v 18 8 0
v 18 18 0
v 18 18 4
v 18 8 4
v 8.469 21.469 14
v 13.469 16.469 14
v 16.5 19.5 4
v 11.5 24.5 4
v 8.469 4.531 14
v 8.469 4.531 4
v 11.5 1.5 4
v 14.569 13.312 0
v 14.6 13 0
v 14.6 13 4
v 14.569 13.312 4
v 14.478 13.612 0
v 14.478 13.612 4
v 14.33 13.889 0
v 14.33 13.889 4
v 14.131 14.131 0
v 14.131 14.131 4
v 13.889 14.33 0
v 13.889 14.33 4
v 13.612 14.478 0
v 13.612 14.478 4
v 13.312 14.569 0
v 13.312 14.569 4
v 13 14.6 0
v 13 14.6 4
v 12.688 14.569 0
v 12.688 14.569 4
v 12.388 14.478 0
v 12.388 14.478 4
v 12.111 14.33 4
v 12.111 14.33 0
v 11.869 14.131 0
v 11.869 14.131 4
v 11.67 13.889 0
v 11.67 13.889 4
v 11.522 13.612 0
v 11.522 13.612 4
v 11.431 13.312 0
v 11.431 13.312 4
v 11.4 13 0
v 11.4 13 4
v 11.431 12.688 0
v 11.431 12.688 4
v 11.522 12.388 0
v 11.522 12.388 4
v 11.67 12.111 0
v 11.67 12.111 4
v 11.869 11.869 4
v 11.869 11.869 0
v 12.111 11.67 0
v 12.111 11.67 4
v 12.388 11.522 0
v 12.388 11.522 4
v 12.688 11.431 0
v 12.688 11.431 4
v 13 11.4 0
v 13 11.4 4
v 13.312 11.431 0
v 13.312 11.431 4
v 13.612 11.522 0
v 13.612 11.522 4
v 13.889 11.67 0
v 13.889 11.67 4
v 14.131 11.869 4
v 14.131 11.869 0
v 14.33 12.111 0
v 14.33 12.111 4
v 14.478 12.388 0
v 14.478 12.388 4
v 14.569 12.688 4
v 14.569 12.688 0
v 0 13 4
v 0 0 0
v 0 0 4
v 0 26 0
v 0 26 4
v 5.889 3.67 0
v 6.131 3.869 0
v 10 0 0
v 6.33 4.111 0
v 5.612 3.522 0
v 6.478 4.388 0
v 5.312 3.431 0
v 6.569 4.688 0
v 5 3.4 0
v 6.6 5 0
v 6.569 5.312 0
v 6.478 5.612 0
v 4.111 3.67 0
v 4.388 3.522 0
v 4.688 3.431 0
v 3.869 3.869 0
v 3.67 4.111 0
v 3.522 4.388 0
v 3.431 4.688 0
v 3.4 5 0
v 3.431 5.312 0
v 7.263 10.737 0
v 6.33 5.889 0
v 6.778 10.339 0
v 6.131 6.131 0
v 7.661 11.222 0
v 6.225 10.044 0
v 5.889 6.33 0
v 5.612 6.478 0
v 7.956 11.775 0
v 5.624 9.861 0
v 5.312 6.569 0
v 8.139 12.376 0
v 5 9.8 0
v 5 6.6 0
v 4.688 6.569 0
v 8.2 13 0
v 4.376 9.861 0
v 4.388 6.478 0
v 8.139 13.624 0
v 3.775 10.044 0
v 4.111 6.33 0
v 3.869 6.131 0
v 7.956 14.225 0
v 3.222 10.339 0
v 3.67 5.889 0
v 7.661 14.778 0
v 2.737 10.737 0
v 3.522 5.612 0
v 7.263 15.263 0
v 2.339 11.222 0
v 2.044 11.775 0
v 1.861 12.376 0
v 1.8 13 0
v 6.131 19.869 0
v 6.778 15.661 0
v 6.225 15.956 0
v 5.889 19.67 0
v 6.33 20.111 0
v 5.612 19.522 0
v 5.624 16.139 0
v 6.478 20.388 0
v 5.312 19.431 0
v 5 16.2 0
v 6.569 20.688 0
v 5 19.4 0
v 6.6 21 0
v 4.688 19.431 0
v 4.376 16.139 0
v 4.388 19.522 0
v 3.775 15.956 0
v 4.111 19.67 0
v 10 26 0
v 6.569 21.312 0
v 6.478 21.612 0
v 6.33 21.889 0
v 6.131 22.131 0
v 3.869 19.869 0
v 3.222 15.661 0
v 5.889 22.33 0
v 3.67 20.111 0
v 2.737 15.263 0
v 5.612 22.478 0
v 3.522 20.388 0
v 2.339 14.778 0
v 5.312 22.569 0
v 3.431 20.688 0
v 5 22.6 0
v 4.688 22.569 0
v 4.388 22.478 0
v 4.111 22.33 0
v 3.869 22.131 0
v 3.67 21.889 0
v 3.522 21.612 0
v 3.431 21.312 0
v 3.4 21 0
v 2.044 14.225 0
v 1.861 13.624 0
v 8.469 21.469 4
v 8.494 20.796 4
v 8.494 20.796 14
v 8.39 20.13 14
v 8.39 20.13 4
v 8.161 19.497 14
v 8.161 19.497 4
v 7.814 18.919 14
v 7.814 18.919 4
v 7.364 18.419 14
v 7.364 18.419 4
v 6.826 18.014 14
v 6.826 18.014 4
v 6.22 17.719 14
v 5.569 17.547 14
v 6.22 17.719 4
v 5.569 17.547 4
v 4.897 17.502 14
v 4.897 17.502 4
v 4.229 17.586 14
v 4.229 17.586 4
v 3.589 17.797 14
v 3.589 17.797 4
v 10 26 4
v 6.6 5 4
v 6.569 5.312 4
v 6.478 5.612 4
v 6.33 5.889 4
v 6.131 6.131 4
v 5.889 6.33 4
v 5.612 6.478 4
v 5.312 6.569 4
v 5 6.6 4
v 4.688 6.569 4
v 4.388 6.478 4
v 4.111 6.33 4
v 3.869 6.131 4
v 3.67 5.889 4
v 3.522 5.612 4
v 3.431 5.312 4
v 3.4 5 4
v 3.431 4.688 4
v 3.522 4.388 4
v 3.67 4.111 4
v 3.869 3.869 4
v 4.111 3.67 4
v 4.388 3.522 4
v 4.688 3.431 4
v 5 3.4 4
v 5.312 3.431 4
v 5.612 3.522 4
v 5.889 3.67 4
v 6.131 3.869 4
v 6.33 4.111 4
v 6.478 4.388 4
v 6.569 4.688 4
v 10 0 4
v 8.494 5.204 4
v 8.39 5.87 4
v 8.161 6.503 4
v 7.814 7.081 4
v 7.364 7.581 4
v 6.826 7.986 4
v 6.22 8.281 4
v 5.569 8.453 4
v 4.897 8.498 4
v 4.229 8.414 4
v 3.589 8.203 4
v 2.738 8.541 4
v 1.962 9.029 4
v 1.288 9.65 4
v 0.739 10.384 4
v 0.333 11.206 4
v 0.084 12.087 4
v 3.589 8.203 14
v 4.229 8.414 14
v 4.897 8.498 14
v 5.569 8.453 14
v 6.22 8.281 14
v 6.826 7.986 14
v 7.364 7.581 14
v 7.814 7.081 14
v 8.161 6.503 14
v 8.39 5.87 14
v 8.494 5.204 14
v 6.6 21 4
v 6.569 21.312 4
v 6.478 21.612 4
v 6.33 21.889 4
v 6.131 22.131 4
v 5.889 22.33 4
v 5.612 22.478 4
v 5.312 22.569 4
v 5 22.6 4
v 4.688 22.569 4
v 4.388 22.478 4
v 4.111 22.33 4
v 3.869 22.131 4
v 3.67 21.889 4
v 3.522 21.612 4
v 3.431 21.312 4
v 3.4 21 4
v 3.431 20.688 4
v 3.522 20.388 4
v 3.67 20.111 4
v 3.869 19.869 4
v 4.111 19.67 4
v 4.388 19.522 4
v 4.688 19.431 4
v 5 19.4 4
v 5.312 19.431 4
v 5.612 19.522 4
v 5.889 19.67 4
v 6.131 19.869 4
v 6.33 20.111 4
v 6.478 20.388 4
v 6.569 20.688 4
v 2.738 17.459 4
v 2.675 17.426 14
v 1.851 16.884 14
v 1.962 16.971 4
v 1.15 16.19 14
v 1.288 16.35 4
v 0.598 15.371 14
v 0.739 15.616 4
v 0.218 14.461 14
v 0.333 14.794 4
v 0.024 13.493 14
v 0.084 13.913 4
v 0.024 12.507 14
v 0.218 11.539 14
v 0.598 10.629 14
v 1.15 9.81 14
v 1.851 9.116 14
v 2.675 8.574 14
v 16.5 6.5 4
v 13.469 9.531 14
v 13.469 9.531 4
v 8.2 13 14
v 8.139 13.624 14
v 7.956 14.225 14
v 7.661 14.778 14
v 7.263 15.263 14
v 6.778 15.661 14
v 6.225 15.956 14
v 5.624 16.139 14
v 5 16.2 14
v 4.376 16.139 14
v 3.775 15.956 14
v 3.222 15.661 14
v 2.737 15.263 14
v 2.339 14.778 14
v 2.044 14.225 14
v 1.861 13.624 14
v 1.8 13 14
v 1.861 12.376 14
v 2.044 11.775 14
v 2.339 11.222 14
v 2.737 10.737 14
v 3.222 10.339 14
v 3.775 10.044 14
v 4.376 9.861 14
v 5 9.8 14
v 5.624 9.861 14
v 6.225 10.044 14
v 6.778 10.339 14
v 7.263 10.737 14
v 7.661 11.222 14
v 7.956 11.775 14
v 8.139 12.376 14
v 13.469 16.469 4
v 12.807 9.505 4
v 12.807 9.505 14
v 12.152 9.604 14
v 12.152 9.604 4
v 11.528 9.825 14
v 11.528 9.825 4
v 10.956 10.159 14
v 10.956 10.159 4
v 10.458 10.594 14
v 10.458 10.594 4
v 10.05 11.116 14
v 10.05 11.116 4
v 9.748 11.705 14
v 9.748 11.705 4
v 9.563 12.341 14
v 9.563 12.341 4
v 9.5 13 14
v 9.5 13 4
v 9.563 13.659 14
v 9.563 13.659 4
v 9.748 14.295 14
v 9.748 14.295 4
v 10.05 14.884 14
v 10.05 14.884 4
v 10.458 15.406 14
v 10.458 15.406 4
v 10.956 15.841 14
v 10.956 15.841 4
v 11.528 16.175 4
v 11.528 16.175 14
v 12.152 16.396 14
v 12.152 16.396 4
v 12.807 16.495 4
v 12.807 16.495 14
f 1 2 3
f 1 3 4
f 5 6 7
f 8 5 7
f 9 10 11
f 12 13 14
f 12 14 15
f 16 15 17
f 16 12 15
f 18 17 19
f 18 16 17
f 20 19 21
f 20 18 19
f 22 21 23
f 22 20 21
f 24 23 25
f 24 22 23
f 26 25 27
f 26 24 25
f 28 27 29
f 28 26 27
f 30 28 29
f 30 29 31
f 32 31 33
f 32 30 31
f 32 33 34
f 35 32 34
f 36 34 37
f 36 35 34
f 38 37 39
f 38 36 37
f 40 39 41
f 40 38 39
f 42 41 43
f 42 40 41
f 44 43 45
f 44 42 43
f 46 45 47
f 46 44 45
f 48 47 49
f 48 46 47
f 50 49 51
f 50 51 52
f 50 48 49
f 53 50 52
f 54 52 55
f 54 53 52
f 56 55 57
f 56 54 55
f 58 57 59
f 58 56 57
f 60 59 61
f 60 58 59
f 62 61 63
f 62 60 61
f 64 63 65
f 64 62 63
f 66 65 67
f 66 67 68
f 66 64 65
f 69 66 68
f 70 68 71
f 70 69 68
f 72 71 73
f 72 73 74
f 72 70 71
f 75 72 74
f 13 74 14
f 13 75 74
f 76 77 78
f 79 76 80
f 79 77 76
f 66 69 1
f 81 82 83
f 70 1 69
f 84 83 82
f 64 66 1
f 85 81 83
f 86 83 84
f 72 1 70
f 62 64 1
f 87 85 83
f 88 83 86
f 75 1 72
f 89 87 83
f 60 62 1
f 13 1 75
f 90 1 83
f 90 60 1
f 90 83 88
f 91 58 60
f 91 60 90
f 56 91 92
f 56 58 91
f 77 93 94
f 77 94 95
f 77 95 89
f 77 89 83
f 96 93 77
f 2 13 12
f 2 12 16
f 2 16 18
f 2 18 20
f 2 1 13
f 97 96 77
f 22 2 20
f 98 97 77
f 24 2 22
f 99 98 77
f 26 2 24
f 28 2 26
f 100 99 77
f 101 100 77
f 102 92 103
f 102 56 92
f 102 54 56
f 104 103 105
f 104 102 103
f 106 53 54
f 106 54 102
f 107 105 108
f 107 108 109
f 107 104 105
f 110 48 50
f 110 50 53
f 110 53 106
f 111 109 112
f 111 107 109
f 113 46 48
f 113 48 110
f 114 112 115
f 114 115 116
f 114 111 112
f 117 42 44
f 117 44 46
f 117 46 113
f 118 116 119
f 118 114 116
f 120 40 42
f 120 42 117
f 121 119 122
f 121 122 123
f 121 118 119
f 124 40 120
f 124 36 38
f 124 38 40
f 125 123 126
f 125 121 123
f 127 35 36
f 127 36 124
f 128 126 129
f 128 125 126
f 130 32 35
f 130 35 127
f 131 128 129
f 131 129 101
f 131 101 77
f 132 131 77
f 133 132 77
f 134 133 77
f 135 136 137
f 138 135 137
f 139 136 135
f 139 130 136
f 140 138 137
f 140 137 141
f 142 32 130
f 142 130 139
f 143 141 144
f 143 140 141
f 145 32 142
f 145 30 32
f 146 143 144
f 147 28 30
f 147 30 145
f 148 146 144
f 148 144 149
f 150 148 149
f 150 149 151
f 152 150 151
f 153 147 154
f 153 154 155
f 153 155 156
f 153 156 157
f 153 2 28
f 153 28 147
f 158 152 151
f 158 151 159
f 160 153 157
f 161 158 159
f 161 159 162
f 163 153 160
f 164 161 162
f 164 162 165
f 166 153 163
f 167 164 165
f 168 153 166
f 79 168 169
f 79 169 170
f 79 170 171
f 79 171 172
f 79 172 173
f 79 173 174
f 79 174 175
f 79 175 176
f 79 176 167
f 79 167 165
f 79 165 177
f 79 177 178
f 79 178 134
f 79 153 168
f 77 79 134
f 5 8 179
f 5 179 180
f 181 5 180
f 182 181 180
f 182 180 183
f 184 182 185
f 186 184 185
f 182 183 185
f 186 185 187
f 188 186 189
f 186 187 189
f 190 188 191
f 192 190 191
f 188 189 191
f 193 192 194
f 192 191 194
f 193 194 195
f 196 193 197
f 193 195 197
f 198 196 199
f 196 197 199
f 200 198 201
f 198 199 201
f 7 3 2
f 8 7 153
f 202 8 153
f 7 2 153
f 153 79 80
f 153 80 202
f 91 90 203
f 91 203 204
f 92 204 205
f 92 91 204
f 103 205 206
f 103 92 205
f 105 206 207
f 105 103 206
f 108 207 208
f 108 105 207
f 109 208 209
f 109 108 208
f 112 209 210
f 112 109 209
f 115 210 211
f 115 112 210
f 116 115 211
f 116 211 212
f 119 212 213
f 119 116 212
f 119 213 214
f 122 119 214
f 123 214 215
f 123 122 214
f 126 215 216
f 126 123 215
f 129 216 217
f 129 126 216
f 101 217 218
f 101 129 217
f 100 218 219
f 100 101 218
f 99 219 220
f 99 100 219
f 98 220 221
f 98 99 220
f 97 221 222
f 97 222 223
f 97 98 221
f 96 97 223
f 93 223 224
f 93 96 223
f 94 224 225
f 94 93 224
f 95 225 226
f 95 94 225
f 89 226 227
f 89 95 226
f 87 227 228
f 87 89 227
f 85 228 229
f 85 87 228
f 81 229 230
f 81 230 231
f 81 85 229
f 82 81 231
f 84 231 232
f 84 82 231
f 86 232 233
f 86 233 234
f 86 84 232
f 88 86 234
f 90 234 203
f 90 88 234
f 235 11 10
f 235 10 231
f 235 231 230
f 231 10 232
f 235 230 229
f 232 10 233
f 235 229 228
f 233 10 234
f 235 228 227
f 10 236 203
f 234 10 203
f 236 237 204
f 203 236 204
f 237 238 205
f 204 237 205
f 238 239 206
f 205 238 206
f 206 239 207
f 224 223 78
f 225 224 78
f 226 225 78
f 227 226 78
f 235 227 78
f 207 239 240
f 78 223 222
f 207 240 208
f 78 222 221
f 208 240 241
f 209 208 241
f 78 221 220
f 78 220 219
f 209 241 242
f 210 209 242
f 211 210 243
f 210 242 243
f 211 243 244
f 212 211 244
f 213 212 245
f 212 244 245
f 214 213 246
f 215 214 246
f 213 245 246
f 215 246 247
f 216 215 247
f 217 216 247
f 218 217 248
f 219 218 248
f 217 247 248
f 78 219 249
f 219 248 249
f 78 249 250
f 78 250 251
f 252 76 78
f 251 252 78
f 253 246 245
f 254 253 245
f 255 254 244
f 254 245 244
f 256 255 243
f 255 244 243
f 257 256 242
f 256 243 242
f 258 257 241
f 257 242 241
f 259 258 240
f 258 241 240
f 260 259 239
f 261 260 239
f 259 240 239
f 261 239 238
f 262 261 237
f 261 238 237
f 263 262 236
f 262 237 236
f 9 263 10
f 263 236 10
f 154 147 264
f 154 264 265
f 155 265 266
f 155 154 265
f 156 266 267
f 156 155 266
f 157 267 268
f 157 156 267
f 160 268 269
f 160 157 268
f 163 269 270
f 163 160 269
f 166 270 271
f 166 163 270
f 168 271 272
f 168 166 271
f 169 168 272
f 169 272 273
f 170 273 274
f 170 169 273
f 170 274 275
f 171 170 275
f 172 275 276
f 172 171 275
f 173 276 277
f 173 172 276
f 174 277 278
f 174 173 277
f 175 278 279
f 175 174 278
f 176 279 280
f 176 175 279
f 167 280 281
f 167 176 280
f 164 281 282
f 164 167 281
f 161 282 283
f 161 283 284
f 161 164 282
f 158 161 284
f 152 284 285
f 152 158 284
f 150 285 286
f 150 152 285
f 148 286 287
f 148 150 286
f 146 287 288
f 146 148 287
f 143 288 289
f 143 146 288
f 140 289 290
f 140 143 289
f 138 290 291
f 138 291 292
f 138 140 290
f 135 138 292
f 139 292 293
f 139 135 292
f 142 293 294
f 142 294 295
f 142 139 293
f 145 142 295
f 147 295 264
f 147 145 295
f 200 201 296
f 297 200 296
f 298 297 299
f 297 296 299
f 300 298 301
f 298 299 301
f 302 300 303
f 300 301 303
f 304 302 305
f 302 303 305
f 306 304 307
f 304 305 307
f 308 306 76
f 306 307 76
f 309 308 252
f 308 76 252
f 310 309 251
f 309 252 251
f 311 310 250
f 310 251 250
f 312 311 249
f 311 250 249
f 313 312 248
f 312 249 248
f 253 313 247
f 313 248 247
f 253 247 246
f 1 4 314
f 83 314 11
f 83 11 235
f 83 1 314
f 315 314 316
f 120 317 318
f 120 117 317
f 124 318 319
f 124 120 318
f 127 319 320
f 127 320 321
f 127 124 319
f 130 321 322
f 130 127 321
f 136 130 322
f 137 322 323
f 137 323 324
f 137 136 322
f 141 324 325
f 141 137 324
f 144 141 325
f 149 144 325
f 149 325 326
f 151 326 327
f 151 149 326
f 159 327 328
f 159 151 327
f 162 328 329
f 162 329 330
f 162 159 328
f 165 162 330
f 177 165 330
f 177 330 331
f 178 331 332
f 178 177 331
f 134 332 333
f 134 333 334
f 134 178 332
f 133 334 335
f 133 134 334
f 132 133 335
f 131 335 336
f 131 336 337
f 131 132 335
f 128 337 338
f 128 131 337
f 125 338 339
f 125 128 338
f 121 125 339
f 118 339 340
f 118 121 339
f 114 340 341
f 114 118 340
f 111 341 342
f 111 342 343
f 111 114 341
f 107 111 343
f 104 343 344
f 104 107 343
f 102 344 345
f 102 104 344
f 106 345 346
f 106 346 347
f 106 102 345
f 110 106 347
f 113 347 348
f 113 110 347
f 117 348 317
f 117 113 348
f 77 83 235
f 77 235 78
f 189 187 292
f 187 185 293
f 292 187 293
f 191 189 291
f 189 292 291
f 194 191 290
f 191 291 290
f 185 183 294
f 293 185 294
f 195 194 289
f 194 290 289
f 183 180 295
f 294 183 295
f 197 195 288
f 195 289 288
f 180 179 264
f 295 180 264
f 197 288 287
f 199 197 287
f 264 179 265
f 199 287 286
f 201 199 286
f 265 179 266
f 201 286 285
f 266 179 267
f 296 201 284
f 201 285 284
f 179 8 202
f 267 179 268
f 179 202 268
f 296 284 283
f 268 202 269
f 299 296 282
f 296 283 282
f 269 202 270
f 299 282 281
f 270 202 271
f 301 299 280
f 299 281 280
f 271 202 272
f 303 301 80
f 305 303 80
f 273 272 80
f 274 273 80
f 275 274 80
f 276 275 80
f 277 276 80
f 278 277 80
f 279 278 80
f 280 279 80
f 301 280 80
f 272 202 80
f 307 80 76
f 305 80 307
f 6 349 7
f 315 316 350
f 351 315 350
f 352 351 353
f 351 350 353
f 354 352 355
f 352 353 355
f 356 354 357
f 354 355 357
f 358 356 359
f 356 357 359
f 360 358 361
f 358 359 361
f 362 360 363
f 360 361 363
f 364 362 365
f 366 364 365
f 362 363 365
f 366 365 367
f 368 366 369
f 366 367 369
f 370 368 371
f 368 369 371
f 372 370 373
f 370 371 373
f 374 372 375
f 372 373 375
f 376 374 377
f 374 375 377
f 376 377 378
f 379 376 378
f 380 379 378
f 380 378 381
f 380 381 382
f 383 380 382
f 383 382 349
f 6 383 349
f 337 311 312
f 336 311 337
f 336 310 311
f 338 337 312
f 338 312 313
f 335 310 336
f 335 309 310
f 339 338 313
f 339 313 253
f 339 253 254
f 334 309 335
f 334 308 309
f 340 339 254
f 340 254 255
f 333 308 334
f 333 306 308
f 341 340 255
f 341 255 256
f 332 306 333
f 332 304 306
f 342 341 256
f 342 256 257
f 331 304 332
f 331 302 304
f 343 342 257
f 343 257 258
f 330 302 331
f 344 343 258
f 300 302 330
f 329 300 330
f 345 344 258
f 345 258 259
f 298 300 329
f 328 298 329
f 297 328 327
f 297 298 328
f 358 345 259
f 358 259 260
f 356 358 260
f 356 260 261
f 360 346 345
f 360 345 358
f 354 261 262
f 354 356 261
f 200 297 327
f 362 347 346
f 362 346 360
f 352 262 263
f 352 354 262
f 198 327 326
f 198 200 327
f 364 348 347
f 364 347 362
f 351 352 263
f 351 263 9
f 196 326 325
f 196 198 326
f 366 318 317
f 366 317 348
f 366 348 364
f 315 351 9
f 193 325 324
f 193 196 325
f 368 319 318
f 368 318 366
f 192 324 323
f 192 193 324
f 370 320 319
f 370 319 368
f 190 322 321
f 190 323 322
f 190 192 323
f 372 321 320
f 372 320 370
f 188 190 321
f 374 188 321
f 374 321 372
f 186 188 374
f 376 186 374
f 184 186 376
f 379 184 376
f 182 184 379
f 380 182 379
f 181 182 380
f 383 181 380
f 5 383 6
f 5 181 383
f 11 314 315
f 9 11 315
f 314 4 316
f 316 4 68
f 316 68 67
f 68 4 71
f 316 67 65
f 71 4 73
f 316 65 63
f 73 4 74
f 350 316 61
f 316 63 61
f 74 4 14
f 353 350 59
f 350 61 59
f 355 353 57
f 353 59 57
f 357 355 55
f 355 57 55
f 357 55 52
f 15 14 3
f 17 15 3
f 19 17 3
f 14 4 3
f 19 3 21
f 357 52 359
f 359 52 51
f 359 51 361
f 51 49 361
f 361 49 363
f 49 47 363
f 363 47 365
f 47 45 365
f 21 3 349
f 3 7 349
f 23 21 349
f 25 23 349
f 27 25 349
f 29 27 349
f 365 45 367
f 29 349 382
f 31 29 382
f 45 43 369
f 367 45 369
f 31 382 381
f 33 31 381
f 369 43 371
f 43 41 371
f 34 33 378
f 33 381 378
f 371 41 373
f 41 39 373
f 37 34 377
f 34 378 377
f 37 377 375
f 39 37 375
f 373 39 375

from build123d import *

# Parameters (mm, degrees)
SKETCH_1_R          = 1.6
SKETCH_1_R_2        = 3.2
EXTRUDE_1_DEPTH     = 4
SKETCH_2_R          = 3.2
EXTRUDE_2_DEPTH     = 10
CUT_EXTRUDE_1_DEPTH = 10
CUT_EXTRUDE_2_DEPTH = 10


with BuildPart() as part:
    # 草图1 → 凸台-拉伸1 (new body)
    with BuildSketch(Plane.XY):
        Polygon((0, 0), (0, 26), (10, 26), (18, 18), (18, 8), (10, 0), align=None)
        with Locations((5, 21)):
            Circle(SKETCH_1_R, mode=Mode.SUBTRACT)
        with Locations((5, 13)):
            Circle(SKETCH_1_R_2, mode=Mode.SUBTRACT)
        with Locations((5, 5)):
            Circle(SKETCH_1_R, mode=Mode.SUBTRACT)
        with Locations((13, 13)):
            Circle(SKETCH_1_R, mode=Mode.SUBTRACT)
    extrude(amount=EXTRUDE_1_DEPTH)

    # 草图2 → 凸台-拉伸2 (add)
    with BuildSketch(Plane.XY.offset(4)):
        with BuildLine():
            Line((13.468501969, 16.468501969), (16.5, 19.5))
            Line((16.5, 19.5), (11.5, 24.5))
            Line((11.5, 24.5), (8.468501969, 21.468501969))
            ThreePointArc((8.468501969, 21.468501969), (7.104490226, 18.203373302), (3.589329863, 17.796875))
            ThreePointArc((3.589329863, 17.796875), (0, 13), (3.589329863, 8.203125))
            ThreePointArc((3.589329863, 8.203125), (7.104490226, 7.796626698), (8.468501969, 4.531498031))
            Line((8.468501969, 4.531498031), (11.5, 1.5))
            Line((11.5, 1.5), (16.5, 6.5))
            Line((16.5, 6.5), (13.468501969, 9.531498031))
            ThreePointArc((13.468501969, 9.531498031), (9.5, 13), (13.468501969, 16.468501969))
        make_face()
        with Locations((5, 13)):
            Circle(SKETCH_2_R, mode=Mode.SUBTRACT)
    extrude(amount=EXTRUDE_2_DEPTH)

    # 草图3 → 切除-拉伸1 (cut)
    with BuildSketch(Plane(origin=(-1.5, 1.5, 0), x_dir=(0, 0, -1), z_dir=(0.707106781, -0.707106781, 0))):
        Polygon((-4, 25.455844123), (-14, 25.455844123), (-14, 21.168658492), align=None)
    extrude(amount=-CUT_EXTRUDE_1_DEPTH, mode=Mode.SUBTRACT)

    # 草图4 → 切除-拉伸2 (cut)
    with BuildSketch(Plane(origin=(11.5, 11.5, 0), x_dir=(0, 0, -1), z_dir=(0.707106781, 0.707106781, 0))):
        Polygon((-4, -7.071067812), (-14, -2.783882181), (-14, -7.071067812), align=None)
    extrude(amount=-CUT_EXTRUDE_2_DEPTH, mode=Mode.SUBTRACT)


solid = part.part
